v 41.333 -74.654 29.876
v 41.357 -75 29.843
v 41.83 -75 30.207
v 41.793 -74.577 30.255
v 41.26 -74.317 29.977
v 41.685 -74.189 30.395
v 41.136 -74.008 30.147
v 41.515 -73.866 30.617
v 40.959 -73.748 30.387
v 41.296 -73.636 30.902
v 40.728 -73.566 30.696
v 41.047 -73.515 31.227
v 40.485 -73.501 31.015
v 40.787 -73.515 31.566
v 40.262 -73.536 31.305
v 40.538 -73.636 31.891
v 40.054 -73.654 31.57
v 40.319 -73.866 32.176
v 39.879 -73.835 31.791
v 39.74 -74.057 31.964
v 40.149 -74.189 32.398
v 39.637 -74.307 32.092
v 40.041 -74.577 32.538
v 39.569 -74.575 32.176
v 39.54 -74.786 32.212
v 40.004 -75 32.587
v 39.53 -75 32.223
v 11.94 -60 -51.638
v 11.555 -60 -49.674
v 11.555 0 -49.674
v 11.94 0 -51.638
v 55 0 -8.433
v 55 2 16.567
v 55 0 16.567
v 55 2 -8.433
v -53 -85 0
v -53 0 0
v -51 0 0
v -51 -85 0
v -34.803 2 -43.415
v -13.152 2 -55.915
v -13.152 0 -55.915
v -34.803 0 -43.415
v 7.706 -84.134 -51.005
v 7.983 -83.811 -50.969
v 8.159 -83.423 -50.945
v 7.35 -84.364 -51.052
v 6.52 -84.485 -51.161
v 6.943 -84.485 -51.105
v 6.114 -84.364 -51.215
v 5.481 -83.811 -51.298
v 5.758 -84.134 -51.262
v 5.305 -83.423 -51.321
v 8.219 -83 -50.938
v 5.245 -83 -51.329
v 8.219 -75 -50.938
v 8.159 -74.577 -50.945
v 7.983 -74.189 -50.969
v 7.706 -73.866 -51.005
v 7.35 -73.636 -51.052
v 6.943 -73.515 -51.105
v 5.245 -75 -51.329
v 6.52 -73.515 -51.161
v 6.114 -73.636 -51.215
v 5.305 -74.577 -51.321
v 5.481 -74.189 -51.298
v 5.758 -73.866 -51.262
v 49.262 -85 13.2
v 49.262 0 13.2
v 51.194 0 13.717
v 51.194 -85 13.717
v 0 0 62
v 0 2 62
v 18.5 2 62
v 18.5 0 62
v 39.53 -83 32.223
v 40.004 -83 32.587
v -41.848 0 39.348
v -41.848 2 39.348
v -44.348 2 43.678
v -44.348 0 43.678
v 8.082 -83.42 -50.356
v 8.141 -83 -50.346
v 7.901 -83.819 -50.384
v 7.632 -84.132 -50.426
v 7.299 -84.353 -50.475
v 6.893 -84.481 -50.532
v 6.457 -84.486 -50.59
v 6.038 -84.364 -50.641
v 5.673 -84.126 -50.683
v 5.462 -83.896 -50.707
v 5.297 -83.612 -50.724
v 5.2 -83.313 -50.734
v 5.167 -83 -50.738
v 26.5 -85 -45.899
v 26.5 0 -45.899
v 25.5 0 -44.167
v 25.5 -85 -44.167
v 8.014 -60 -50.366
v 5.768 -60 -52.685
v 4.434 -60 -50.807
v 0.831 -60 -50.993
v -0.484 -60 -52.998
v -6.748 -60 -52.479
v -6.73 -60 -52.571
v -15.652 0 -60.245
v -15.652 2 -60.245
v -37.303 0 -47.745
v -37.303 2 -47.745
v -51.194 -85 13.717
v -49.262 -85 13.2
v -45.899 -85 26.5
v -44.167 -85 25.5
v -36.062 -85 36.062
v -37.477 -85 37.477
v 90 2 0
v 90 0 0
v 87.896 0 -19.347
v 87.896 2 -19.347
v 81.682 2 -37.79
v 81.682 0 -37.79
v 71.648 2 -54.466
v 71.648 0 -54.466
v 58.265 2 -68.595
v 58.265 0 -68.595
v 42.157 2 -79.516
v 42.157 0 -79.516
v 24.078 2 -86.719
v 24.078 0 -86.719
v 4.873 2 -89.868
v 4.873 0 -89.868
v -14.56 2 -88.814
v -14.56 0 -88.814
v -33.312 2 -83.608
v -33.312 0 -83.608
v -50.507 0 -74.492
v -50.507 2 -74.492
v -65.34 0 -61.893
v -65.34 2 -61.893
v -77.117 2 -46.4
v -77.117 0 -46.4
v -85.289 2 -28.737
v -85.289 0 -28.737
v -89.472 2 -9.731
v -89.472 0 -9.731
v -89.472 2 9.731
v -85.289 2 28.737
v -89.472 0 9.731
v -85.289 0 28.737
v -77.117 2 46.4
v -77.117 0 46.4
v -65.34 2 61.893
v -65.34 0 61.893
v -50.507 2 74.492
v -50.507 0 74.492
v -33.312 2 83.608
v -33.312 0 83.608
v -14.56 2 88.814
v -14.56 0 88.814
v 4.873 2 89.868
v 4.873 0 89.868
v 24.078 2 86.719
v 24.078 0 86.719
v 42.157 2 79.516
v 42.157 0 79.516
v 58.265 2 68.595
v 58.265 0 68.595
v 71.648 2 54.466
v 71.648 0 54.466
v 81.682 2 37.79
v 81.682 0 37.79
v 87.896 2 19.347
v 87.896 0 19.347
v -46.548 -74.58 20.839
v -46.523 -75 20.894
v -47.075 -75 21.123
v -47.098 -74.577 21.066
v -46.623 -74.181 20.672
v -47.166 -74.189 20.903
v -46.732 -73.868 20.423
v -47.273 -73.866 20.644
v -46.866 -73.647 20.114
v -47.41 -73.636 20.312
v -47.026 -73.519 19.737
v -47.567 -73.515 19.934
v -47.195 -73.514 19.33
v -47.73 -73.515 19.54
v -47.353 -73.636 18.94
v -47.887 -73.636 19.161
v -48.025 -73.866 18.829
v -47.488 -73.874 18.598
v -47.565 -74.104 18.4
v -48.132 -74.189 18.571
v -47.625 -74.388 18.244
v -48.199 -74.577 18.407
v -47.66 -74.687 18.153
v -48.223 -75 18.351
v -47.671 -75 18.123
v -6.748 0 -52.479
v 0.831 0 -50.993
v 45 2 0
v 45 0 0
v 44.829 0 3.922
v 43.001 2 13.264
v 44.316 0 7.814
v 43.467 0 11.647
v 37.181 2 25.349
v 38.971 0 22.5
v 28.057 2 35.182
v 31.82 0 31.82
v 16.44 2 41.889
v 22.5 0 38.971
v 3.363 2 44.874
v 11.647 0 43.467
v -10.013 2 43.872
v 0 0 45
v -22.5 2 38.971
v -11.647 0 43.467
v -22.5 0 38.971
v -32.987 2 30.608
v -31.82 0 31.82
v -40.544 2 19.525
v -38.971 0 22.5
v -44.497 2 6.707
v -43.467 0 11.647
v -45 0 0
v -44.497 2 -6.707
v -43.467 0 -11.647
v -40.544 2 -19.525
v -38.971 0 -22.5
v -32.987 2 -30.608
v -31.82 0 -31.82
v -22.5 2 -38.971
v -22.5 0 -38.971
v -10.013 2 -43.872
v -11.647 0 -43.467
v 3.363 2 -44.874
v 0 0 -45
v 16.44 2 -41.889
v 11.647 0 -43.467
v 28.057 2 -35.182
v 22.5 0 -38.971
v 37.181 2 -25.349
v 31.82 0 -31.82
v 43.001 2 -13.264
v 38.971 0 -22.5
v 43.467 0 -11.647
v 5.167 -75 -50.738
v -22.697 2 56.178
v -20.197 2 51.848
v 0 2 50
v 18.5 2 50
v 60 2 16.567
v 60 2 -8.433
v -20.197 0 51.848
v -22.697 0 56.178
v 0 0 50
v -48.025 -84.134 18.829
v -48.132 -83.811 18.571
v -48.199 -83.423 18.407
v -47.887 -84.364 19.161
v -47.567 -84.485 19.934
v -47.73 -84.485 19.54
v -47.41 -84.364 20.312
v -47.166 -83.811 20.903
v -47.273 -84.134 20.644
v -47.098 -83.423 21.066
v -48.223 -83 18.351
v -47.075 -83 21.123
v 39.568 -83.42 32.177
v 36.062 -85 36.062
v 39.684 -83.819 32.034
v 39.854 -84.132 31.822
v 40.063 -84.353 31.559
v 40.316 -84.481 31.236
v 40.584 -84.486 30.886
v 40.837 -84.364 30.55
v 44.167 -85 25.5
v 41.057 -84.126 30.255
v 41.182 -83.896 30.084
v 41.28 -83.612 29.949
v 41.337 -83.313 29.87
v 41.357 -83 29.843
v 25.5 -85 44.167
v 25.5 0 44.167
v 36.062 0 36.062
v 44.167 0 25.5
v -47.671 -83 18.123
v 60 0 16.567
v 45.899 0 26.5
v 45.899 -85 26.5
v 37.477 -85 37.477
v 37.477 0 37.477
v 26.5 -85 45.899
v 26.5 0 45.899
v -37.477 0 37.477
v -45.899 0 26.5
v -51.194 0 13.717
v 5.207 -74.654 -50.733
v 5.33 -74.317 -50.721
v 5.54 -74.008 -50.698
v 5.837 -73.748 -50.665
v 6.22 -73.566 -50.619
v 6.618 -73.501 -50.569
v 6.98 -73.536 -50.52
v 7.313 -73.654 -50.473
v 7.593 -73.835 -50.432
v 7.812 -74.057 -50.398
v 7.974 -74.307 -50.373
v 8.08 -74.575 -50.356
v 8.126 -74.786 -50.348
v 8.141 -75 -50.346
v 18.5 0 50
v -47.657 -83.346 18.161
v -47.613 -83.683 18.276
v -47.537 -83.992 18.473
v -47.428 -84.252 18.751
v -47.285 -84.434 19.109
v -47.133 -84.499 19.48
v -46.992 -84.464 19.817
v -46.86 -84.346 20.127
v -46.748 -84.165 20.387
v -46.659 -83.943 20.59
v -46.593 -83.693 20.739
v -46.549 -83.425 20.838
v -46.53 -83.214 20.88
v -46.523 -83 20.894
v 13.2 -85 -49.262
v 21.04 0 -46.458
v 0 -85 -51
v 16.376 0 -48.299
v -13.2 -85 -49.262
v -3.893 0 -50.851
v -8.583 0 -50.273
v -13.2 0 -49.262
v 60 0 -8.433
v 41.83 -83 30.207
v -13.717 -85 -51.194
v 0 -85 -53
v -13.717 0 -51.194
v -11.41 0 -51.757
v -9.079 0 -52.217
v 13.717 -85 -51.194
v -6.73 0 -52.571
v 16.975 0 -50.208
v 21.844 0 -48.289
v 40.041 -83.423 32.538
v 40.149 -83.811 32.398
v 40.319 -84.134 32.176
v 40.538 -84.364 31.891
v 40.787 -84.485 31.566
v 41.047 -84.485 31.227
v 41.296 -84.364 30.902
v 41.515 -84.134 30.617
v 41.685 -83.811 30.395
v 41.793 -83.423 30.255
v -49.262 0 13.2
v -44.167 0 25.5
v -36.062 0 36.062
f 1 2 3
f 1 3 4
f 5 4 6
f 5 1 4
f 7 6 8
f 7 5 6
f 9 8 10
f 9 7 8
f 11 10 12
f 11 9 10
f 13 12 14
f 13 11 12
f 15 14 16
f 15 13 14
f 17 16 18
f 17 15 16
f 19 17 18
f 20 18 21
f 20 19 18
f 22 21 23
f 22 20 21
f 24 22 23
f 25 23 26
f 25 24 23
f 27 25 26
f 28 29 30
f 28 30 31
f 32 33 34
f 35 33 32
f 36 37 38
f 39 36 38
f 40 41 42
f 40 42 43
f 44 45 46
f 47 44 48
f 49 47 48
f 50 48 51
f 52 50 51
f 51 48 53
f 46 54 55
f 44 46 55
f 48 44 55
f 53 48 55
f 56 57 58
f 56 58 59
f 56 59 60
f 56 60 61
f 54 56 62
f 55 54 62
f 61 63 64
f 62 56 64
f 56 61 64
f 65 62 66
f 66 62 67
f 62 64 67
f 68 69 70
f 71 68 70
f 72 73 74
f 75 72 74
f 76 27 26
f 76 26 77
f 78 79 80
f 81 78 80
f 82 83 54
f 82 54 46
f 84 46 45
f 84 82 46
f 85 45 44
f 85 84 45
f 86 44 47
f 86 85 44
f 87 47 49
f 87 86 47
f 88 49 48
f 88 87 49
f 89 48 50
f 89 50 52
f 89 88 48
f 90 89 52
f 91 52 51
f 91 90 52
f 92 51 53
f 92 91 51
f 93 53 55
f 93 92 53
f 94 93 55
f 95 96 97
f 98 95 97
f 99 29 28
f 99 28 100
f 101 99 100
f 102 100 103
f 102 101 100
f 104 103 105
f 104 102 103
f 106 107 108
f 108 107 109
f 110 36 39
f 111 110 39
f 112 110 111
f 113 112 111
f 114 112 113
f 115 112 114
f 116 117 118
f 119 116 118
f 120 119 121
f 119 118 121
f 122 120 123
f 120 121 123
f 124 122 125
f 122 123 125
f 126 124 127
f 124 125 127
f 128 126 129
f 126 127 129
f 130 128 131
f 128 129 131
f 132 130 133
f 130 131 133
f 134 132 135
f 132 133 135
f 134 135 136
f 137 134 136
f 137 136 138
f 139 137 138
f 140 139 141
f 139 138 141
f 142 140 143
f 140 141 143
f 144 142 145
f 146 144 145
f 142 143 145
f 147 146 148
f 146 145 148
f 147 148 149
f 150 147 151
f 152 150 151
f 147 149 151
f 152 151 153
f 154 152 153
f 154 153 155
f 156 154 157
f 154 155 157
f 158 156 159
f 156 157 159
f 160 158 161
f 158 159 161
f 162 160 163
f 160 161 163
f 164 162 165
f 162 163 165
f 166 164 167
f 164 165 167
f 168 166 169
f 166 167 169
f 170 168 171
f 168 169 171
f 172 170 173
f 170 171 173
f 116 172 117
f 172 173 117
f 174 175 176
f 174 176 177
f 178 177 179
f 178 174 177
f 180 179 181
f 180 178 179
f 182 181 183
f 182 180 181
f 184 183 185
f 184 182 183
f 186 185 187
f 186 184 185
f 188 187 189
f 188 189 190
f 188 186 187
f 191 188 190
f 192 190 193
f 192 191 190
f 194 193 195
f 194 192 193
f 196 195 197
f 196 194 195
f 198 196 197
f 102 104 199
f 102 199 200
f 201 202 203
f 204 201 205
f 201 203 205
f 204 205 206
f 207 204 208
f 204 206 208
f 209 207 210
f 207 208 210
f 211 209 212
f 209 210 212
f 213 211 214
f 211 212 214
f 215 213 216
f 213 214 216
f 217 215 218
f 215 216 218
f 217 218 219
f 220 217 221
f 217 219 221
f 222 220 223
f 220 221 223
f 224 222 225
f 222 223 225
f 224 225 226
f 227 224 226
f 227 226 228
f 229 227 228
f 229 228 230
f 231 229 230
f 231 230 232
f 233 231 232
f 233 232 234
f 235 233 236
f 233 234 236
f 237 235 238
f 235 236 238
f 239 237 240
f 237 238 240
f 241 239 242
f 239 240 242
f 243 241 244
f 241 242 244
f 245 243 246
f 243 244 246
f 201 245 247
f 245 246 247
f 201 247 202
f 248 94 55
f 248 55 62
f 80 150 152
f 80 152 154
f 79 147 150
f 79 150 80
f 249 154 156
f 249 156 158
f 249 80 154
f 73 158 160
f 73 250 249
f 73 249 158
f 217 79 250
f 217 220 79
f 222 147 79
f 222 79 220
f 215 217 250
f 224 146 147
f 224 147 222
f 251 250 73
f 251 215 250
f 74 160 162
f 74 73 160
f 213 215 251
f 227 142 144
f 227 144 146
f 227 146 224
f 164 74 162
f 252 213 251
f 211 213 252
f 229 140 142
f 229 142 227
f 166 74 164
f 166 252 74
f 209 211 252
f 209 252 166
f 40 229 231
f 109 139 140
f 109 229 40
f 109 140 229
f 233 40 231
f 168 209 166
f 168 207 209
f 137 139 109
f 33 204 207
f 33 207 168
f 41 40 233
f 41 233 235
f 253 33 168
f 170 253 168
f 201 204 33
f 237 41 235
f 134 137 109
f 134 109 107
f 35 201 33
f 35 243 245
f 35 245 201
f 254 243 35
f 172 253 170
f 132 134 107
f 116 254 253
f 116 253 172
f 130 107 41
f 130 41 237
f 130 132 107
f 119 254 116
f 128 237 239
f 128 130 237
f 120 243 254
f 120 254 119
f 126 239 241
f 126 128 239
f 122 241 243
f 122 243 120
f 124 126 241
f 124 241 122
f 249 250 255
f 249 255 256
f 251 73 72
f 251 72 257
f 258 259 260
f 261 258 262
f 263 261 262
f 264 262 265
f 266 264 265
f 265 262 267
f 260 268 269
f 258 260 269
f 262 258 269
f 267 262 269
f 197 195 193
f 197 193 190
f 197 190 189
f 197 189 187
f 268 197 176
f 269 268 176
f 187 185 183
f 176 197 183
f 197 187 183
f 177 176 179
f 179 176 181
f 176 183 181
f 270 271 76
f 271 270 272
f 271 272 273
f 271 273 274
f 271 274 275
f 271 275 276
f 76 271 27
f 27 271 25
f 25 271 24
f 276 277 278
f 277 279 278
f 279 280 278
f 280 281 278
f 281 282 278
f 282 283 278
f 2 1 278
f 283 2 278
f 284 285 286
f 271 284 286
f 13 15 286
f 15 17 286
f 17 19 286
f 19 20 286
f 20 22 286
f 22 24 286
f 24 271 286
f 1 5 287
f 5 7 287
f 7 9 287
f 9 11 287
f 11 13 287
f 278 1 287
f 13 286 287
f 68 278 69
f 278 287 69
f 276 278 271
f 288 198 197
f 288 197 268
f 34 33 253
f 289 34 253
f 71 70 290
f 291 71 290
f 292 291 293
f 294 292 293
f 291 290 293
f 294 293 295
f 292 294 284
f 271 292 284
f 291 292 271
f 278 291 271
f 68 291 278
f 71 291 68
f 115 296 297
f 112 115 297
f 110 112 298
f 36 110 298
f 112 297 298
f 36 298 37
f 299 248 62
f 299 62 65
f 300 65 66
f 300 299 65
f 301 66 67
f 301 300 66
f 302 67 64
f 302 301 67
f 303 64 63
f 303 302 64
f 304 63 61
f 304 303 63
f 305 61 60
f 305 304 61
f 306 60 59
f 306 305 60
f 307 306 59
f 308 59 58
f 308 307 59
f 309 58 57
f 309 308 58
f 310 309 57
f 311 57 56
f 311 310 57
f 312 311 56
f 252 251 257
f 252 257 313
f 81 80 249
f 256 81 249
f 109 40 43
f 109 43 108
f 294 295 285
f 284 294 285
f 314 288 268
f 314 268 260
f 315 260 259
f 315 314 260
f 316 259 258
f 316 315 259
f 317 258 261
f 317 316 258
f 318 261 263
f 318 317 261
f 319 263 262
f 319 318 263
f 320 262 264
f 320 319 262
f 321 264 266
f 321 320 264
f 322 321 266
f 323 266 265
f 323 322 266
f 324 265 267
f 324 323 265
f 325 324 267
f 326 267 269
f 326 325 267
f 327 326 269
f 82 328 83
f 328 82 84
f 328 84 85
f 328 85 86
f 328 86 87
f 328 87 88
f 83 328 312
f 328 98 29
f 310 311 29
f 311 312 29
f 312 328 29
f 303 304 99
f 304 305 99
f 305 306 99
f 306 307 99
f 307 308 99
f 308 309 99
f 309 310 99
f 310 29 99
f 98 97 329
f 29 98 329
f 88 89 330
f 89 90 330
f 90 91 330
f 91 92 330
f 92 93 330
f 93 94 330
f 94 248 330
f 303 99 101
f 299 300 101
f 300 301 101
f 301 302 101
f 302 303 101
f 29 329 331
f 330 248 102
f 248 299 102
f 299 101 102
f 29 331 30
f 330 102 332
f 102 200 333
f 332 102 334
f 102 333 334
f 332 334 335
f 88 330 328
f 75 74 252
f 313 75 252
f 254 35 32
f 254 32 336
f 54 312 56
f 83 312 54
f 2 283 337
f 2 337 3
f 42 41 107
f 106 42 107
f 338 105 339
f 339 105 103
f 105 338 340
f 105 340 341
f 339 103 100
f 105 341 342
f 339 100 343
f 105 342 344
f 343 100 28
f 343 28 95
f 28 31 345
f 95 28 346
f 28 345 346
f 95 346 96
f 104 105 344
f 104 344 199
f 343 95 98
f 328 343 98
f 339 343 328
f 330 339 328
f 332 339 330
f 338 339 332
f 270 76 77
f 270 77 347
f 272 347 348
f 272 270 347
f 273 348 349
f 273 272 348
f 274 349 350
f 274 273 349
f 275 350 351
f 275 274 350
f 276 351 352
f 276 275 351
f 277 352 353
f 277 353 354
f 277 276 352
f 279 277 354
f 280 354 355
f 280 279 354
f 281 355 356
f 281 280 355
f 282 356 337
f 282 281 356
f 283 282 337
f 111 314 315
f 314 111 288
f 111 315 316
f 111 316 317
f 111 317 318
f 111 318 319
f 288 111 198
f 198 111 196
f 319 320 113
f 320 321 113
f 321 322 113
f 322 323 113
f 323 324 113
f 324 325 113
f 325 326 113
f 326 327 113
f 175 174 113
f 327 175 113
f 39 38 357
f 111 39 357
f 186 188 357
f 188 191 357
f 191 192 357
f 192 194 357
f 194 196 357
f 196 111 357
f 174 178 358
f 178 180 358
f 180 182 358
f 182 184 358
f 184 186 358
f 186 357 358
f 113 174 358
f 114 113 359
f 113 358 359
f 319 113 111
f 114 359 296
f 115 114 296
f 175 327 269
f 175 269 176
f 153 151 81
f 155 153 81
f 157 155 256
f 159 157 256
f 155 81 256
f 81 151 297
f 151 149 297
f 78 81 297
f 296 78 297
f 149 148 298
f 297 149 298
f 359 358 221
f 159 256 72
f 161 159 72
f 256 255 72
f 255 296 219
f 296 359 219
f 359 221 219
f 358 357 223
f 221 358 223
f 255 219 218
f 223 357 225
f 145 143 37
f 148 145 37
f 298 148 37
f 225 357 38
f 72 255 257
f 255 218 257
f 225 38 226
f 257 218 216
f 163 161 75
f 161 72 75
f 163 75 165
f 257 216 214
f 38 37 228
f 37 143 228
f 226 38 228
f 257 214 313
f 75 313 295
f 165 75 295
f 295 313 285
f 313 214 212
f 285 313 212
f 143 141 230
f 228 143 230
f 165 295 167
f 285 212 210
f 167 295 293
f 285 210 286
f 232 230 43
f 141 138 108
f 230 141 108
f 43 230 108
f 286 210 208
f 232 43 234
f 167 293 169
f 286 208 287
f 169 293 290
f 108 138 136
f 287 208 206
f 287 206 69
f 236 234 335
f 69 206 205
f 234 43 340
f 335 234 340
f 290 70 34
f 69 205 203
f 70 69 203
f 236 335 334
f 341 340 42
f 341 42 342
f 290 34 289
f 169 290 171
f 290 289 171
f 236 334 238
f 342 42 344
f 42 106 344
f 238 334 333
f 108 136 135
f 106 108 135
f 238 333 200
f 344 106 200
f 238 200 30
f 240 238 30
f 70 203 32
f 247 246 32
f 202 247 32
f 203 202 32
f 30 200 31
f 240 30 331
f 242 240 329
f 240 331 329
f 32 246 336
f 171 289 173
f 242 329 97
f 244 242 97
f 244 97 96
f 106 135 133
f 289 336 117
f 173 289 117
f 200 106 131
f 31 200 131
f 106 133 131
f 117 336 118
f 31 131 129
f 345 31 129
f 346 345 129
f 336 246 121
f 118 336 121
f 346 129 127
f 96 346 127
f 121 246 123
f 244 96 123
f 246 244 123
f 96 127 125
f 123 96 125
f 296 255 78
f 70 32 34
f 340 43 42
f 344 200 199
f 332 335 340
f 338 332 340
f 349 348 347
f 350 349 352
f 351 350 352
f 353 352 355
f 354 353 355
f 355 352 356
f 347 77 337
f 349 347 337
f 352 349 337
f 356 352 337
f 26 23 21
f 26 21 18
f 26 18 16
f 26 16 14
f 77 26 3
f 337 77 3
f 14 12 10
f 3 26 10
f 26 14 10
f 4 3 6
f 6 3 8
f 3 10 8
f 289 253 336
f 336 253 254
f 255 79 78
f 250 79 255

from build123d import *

# Parameters (mm, degrees)
SKETCH3_R           = 90
BOSS_EXTRUDE3_DEPTH = 2
SKETCH4_R           = 45
CUT_EXTRUDE1_DEPTH  = 2
BOSS_EXTRUDE4_DEPTH = 85
BOSS_EXTRUDE5_DEPTH = 85
CUT_EXTRUDE9_DEPTH  = 10
CIRPATTERN4_COUNT   = 3
CUT_EXTRUDE5_DEPTH  = 60
SKETCH15_W          = 5
SKETCH15_H          = 25
CUT_EXTRUDE10_DEPTH = 88.0000001
CIRPATTERN5_COUNT   = 3
SKETCH16_R          = 46
CUT_EXTRUDE11_DEPTH = 85
BOSS_EXTRUDE6_DEPTH = 2
SKETCH18_W          = 18.5
SKETCH18_H          = 12
CUT_EXTRUDE12_DEPTH = 2


with BuildPart() as part:
    # Sketch3 → Boss-Extrude3 (new body)
    with BuildSketch(Plane(origin=(0, 0, 0), x_dir=(1, 0, 0), z_dir=(0, 1, 0))):
        Circle(SKETCH3_R)
    extrude(amount=BOSS_EXTRUDE3_DEPTH)

    # Sketch4 → Cut-Extrude1 (cut)
    with BuildSketch(Plane.XZ):
        Circle(SKETCH4_R)
    extrude(amount=-CUT_EXTRUDE1_DEPTH, mode=Mode.SUBTRACT)

    # Sketch6 → Boss-Extrude4 (add)
    with BuildSketch(Plane.XZ):
        with BuildLine():
            Line((-46, 0), (-45, 0))
            ThreePointArc((-45, 0), (-41.574578963, 17.220754456), (-31.819805153, 31.819805153))
            Line((-31.819805153, 31.819805153), (-32.526911935, 32.526911935))
            ThreePointArc((-32.526911935, 32.526911935), (-42.498458496, 17.603437889), (-46, 0))
        make_face()
    boss_extrude4 = extrude(amount=BOSS_EXTRUDE4_DEPTH)

    # Sketch6<3> → Boss-Extrude5 (add)
    with BuildSketch(Plane.XZ):
        with BuildLine():
            Line((-53, 0), (-51, 0))
            ThreePointArc((-51, 0), (-47.117856158, 19.516855051), (-36.062445841, 36.062445841))
            Line((-36.062445841, 36.062445841), (-37.476659403, 37.476659403))
            ThreePointArc((-37.476659403, 37.476659403), (-48.965615223, 20.282221915), (-53, 0))
        make_face()
    boss_extrude5 = extrude(amount=BOSS_EXTRUDE5_DEPTH)

    # Sketch14 → Cut-Extrude9 (cut)
    with BuildSketch(Plane(origin=(-38.409902577, 0, 15.909902577), x_dir=(-0.382683432, 0, -0.923879533), z_dir=(0.923879533, 0, -0.382683432))):
        with BuildLine():
            Line((1.5, -75), (1.5, -83))
            ThreePointArc((1.5, -83), (0, -84.5), (-1.5, -83))
            Line((-1.5, -83), (-1.5, -75))
            ThreePointArc((-1.5, -75), (0, -73.5), (1.5, -75))
        make_face()
    cut_extrude9 = extrude(amount=-CUT_EXTRUDE9_DEPTH, mode=Mode.SUBTRACT)

    # CirPattern4: Boss-Extrude4, Boss-Extrude5, Cut-Extrude9 ×3 about axis
    cirpattern4_axis = Axis((0, 0, 0), (0, 1, 0))
    for i in range(1, CIRPATTERN4_COUNT):
        add(boss_extrude4.rotate(cirpattern4_axis, i * 360 / CIRPATTERN4_COUNT))
        add(boss_extrude5.rotate(cirpattern4_axis, i * 360 / CIRPATTERN4_COUNT))
        add(cut_extrude9.rotate(cirpattern4_axis, i * 360 / CIRPATTERN4_COUNT), mode=Mode.SUBTRACT)

    # Sketch11 → Cut-Extrude5 (cut, symmetric)
    with BuildSketch(Plane.XZ):
        Polygon((-6.747570404, -52.479477871), (11.40662685, -48.919264104), (13.715954699, -60.69495962), (-4.438242555, -64.255173387), align=None)
    extrude(amount=CUT_EXTRUDE5_DEPTH, both=True, mode=Mode.SUBTRACT)

    # Sketch15 → Cut-Extrude10 (cut, through all)
    with BuildSketch(Plane(origin=(0, 2, 0), x_dir=(1, 0, 0), z_dir=(0, 1, 0))):
        with Locations((57.5, -4.067185812)):
            Rectangle(SKETCH15_W, SKETCH15_H)
    cut_extrude10 = extrude(amount=-CUT_EXTRUDE10_DEPTH, mode=Mode.SUBTRACT)

    # CirPattern5: Cut-Extrude10 ×3 about axis
    cirpattern5_axis = Axis((0, 0, 0), (0, 1, 0))
    for i in range(1, CIRPATTERN5_COUNT):
        add(cut_extrude10.rotate(cirpattern5_axis, i * 360 / CIRPATTERN5_COUNT), mode=Mode.SUBTRACT)

    # Sketch16 → Cut-Extrude11 (cut)
    with BuildSketch(Plane.XZ.offset(85)):
        Circle(SKETCH16_R)
    extrude(amount=-CUT_EXTRUDE11_DEPTH, mode=Mode.SUBTRACT)

    # Sketch17 → Boss-Extrude6 (add)
    with BuildSketch(Plane(origin=(0, 2, 0), x_dir=(1, 0, 0), z_dir=(0, 1, 0))):
        Polygon((13.715954699, 60.69495962), (-4.438242555, 64.255173387), (-6.747570404, 52.479477871), (11.40662685, 48.919264104), align=None)
    extrude(amount=-BOSS_EXTRUDE6_DEPTH)

    # Sketch18 → Cut-Extrude12 (cut)
    with BuildSketch(Plane(origin=(0, 2, 0), x_dir=(1, 0, 0), z_dir=(0, 1, 0))):
        with Locations((9.25, -56)):
            Rectangle(SKETCH18_W, SKETCH18_H)
    extrude(amount=-CUT_EXTRUDE12_DEPTH, mode=Mode.SUBTRACT)


solid = part.part
